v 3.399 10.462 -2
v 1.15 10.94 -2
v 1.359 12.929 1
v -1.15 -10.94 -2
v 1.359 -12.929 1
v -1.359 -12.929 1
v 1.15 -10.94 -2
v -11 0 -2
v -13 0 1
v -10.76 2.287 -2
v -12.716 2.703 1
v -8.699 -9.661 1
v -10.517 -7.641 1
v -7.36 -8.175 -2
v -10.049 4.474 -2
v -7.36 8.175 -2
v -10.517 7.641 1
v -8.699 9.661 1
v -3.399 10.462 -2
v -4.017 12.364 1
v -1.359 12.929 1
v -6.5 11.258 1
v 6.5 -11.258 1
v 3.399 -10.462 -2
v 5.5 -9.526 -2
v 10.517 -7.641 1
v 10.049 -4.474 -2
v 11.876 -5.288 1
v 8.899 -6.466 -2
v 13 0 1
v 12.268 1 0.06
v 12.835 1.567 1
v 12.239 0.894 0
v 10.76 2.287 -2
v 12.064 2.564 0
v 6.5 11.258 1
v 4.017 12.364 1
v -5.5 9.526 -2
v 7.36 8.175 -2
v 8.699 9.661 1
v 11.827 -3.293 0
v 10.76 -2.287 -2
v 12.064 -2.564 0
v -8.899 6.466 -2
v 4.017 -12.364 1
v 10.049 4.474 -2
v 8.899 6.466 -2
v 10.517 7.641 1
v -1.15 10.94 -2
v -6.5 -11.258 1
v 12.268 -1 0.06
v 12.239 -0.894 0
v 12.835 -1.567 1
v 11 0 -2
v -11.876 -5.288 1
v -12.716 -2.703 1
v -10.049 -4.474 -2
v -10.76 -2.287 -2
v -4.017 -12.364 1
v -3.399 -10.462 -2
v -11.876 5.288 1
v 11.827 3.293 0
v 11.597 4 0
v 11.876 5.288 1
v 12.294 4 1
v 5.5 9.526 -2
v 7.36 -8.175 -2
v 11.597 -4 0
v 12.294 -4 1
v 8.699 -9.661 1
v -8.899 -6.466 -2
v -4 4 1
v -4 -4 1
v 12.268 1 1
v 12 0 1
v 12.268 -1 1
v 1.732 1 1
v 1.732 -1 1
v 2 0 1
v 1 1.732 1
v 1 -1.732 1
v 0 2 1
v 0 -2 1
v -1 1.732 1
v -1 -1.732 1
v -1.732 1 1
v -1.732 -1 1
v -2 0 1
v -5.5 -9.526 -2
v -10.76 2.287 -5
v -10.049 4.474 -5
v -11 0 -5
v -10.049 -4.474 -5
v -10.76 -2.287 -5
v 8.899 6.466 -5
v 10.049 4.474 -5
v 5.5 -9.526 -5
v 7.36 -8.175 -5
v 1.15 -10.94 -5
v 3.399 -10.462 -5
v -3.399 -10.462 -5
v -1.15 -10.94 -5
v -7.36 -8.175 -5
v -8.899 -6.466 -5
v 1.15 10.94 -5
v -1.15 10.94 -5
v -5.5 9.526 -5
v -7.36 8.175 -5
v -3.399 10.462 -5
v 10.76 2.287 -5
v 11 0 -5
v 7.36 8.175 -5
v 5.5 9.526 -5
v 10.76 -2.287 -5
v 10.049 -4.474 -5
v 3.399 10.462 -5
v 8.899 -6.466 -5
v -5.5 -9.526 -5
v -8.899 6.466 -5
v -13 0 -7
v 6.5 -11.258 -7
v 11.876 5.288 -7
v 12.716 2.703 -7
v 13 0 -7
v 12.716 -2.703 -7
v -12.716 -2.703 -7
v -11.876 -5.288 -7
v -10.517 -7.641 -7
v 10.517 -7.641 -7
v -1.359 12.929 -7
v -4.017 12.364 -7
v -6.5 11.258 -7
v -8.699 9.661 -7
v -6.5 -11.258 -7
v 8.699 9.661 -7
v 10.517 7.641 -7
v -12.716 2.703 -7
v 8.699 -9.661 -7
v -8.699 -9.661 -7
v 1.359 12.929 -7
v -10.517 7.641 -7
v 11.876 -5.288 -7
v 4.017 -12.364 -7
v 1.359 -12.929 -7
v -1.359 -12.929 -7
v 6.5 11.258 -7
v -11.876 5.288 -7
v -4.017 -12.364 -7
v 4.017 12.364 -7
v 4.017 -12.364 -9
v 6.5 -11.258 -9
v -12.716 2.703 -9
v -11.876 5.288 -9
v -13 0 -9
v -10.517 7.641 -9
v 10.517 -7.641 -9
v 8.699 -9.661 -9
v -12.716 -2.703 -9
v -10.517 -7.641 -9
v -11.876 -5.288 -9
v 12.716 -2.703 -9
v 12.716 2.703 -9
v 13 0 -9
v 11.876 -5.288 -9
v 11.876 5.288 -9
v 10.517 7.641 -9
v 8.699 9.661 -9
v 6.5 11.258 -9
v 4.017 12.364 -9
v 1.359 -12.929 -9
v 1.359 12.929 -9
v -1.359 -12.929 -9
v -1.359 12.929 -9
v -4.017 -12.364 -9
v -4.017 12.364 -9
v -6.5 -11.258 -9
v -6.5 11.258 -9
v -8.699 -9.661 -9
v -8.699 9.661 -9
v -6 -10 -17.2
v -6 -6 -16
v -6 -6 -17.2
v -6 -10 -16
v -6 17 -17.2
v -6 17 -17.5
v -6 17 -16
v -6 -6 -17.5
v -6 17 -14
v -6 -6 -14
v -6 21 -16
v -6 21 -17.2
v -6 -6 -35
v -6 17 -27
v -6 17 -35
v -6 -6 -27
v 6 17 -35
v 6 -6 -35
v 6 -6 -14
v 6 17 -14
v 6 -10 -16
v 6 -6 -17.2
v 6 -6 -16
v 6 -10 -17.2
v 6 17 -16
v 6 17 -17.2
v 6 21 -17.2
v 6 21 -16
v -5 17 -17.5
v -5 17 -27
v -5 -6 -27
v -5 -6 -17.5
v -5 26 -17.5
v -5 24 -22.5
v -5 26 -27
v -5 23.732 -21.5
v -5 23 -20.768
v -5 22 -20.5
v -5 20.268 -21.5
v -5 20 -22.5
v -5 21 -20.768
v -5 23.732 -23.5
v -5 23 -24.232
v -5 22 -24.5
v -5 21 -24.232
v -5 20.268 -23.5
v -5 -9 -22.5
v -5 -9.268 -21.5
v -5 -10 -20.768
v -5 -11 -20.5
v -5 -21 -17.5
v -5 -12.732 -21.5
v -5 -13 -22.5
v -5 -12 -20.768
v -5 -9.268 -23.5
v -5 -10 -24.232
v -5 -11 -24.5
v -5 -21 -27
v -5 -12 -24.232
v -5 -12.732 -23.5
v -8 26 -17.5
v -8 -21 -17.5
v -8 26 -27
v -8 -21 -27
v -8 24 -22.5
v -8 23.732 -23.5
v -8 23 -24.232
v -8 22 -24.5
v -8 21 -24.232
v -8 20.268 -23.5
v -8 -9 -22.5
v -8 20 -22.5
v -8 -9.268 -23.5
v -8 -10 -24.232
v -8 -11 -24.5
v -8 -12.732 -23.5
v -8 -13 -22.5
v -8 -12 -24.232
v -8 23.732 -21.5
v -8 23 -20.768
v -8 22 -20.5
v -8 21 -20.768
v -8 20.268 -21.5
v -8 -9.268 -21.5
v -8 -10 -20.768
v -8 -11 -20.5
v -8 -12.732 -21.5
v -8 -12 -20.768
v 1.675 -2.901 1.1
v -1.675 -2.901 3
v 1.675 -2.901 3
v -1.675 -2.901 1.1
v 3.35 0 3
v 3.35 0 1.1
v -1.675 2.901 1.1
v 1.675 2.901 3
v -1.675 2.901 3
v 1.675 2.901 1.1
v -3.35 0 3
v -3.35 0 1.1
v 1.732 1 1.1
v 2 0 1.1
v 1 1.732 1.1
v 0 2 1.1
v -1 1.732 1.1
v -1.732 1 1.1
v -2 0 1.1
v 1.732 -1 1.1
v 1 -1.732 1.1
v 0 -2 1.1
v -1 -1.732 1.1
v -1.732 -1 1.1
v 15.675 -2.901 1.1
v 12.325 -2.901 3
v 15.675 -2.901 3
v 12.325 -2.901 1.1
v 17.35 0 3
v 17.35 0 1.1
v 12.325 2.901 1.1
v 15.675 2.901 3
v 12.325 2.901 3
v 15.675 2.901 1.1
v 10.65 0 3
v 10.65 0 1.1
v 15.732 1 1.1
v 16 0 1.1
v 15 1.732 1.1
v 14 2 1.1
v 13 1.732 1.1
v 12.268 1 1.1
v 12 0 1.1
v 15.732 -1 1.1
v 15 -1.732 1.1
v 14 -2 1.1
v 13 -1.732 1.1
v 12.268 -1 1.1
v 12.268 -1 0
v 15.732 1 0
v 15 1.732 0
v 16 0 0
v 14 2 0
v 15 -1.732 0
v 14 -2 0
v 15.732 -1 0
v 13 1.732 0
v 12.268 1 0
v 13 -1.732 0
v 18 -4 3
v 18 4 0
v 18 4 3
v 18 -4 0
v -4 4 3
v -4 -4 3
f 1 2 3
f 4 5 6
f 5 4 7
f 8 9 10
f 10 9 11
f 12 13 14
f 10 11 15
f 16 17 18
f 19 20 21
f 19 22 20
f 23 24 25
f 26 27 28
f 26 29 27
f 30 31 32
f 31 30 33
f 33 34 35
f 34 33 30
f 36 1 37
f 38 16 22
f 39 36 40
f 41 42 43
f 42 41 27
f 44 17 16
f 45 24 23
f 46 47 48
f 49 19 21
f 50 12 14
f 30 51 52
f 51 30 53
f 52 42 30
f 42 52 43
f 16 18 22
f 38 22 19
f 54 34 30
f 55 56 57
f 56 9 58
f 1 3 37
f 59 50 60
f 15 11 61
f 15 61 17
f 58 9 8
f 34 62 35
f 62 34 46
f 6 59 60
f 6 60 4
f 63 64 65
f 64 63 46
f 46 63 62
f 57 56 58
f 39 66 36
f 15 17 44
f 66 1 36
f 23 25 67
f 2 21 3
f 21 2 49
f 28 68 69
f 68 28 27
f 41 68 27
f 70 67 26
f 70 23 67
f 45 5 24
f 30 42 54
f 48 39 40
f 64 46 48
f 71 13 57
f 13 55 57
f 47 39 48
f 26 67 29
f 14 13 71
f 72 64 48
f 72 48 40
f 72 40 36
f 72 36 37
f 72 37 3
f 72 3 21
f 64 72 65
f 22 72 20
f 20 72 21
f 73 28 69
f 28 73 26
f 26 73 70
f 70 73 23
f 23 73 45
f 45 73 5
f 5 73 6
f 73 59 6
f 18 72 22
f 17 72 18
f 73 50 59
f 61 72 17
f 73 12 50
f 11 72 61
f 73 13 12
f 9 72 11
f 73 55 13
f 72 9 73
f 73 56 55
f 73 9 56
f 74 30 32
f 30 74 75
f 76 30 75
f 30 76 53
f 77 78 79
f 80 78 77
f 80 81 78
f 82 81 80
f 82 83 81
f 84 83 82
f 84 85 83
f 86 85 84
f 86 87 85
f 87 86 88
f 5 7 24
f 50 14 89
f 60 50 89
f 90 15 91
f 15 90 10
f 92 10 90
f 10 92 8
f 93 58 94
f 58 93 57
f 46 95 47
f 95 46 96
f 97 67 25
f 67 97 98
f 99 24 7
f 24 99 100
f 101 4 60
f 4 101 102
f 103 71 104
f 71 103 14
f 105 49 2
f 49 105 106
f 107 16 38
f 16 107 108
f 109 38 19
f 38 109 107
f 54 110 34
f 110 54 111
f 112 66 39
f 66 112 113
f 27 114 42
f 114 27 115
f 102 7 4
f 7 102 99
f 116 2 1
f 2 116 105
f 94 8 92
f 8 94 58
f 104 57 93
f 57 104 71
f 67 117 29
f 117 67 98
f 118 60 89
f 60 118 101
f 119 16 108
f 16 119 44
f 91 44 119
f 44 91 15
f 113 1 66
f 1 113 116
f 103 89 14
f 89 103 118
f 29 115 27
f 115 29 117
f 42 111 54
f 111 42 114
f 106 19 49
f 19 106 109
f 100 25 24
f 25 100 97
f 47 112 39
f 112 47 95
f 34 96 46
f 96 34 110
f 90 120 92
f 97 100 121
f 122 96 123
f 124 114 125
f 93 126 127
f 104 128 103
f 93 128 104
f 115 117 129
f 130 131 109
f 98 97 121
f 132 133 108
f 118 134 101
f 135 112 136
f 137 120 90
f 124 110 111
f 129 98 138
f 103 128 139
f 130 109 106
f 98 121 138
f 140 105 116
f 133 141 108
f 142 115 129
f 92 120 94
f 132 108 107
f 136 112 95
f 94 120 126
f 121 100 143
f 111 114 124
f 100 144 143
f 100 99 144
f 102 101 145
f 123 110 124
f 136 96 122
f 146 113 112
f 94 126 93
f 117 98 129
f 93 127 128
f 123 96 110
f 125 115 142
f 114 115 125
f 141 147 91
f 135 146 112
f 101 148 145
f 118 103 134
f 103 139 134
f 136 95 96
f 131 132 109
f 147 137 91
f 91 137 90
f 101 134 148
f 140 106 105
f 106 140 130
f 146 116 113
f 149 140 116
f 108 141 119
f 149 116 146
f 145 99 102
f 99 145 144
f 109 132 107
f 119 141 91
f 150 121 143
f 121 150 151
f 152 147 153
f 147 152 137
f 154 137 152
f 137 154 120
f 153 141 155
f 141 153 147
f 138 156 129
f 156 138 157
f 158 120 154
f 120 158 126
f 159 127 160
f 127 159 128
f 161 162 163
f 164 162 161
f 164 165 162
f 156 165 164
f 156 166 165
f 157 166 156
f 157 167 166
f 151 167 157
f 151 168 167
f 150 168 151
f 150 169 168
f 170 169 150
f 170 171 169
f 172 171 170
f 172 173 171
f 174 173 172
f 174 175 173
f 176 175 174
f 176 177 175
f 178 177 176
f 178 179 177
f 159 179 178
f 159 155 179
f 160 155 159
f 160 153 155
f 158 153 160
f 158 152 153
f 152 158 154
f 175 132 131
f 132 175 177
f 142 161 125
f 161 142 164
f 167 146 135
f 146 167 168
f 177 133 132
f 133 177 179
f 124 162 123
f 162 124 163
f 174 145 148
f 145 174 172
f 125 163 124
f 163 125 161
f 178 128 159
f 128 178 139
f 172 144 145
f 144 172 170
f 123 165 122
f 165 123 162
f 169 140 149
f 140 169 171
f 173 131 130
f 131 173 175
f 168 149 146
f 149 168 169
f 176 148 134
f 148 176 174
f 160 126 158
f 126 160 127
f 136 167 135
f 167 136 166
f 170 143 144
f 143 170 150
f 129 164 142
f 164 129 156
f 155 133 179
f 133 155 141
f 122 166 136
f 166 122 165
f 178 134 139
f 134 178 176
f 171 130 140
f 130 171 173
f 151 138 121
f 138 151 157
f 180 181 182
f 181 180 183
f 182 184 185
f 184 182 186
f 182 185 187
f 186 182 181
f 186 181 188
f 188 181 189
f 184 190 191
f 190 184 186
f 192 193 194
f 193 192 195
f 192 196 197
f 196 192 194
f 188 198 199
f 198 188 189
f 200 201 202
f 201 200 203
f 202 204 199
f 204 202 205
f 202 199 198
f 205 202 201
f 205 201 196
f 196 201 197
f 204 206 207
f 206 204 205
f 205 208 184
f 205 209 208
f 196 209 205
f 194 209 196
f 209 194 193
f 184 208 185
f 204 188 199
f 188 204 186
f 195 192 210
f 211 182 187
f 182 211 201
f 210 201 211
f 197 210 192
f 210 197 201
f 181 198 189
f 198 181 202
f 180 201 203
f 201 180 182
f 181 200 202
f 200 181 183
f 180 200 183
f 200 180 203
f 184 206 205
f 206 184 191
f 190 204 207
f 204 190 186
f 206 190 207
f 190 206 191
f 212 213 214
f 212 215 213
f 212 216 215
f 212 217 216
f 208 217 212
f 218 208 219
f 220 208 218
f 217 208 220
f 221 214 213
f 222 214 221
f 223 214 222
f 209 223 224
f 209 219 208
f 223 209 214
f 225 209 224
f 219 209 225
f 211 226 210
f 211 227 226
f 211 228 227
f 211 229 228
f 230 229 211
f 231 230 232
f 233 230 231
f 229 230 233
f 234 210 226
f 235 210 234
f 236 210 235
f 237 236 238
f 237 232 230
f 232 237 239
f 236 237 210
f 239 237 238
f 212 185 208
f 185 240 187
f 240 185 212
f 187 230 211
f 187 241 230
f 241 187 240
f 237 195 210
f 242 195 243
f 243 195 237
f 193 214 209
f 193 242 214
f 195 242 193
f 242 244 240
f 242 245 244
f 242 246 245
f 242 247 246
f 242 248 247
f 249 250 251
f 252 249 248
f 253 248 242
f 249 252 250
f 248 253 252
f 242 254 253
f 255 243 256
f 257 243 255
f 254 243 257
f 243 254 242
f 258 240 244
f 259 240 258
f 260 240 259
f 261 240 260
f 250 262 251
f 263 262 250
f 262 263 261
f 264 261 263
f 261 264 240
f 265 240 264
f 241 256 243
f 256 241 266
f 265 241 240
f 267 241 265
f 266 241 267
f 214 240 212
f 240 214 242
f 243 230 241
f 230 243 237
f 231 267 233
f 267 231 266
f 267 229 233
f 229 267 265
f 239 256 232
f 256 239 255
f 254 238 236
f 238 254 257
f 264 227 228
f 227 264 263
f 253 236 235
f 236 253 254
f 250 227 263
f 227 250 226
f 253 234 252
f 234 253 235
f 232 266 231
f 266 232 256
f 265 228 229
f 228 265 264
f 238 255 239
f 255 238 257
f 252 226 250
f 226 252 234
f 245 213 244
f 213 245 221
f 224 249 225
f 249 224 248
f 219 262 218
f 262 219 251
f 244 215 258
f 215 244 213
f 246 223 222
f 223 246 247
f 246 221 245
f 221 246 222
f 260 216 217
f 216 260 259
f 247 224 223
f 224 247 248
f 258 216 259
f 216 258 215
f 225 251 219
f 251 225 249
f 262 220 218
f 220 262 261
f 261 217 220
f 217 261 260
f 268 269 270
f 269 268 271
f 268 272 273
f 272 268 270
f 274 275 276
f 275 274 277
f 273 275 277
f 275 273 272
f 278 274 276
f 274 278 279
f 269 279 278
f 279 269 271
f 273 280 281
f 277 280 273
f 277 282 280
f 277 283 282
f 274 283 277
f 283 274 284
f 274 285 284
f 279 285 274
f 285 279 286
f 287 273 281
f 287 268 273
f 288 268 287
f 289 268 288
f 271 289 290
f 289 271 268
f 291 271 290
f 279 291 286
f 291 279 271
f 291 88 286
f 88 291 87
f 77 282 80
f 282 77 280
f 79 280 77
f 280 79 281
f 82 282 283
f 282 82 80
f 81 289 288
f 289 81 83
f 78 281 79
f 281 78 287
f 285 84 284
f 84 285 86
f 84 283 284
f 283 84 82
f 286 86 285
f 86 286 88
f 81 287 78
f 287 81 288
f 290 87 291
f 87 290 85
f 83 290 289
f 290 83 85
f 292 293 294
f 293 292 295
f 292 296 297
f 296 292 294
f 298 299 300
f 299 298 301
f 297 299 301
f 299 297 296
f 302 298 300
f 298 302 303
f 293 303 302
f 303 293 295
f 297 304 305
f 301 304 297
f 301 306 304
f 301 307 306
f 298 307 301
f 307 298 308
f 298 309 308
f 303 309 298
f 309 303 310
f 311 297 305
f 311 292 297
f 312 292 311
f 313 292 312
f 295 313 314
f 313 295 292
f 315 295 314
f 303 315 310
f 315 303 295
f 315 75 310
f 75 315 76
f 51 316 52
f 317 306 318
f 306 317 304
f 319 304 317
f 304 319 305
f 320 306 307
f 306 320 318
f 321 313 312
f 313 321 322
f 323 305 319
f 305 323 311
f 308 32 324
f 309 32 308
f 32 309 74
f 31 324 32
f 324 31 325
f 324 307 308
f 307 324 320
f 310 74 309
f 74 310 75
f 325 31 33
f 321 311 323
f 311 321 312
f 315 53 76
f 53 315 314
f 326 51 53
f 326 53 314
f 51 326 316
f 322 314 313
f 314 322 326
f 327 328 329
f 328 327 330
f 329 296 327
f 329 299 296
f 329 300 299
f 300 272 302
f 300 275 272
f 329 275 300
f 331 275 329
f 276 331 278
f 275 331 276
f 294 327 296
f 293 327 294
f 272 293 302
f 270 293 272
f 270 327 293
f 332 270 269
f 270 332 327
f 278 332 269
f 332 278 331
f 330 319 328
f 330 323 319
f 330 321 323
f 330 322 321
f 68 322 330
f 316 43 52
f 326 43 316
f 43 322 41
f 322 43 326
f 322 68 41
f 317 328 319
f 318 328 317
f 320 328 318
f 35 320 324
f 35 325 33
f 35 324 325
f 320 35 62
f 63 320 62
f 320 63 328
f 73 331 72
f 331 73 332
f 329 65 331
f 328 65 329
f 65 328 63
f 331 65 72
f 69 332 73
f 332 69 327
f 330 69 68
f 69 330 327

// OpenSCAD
// file: gearModule.scad
/* the original one was posted by by Entropic
 * on Jan 30, 2015; 5:25pm,  on OpenSCAD official forum
 *
 * License? by official author:
 * "Also I thought that someone might benefit from this if they aren't able to make a gear themselves."
 *
 */

numberOfTeeth = 20;
widthOfTeeth = 4;
heightOfTeeth = 5;
thicknessOfGear = 5;
radiusOfHoleForShaft = 4.242640687;  //If shaft is square, find the square of one side,
sidesOfShaft = 4;                    //multiply by two and then square root that to get radius
//diameter = ((teethNo x 1.7 x teethWidth)/pi)+ 2teethHeight

module tooth(width, thickness, height){
  scale([width/5,thickness/5,height/10]){
    difference(){
      translate([-2.5,0,0])
      cube([5,5,10]);
      translate([5+1.25-2.5,0-1,0])
      rotate([0,-14.0362434,0])
        cube([5,5+2,12]);
      translate([0-1.25-2.5,0+5+1,0])
      rotate([0,-14.0362434,180])
        cube([5,5+2,12]);
    }
  }
}
module gear(toothNo, toothWidth, toothHeight, thickness,holeRadius,holeSides){
  radius = (toothWidth*1.7*toothNo)/3.141592653589793238/2;
  rotate([-90,0,0])
  difference(){
    union(){
      for(i=[0:toothNo]){
        rotate([0,(360/toothNo)*i,0])
        translate([0,0,radius-0.5])
          tooth(toothWidth,thickness,toothHeight);
      }
      translate([0,thickness,0])
      rotate([90,0,0])
        cylinder(r=radius, h=thickness);
    }
  translate([0,thickness+1,0])
  rotate([90,0,0])
    cylinder(r=holeRadius,h=thickness+2,$fn=holeSides);
  }
}

module gearInside(toothNo, toothWidth, toothHeight, thickness,holeRadius,holeSides){
  radius = (toothWidth*1.7*toothNo)/3.141592653589793238/2;
  rotate([-90,0,0])
//  difference(){
    union(){
      for(i=[0:toothNo]){
        rotate([0,(360/toothNo)*i,0])
        translate([0,0,radius-0.5])
            mirror([0,0,1])
                translate([0,0,-toothHeight]) 
                    tooth(toothWidth,thickness,toothHeight);
      }
    }
//  translate([0,thickness+1,0])
//  rotate([90,0,0])
//    cylinder(r=holeRadius,h=thickness+2,$fn=holeSides);
//  }
}


//gear(numberOfTeeth,widthOfTeeth,heightOfTeeth,thicknessOfGear,radiusOfHoleForShaft,sidesOfShaft);

gearInside(numberOfTeeth,widthOfTeeth,heightOfTeeth,thicknessOfGear,radiusOfHoleForShaft,sidesOfShaft);

// tooth(toothWidth,thickness,toothHeight);

tooth(widthOfTeeth,thicknessOfGear,heightOfTeeth);

numberOfTeeth = 20;
widthOfTeeth = 4;
heightOfTeeth = 5;
thicknessOfGear = 5;
radiusOfHoleForShaft = 4.242640687;  //If shaft is square, find the square of one side,
sidesOfShaft = 4;                    //multiply by two and then square root that to get radius
//diameter = ((teethNo x 1.7 x teethWidth)/pi)+ 2teethHeight

module tooth(width, thickness, height){
  scale([width/5,thickness/5,height/10]){
    difference(){
      translate([-2.5,0,0])
      cube([5,5,10]);
      translate([5+1.25-2.5,0-1,0])
      rotate([0,-14.0362434,0])
        cube([5,5+2,12]);
      translate([0-1.25-2.5,0+5+1,0])
      rotate([0,-14.0362434,180])
        cube([5,5+2,12]);
    }
  }
}
module gear(toothNo, toothWidth, toothHeight, thickness,holeRadius,holeSides){
  radius = (toothWidth*1.7*toothNo)/3.141592653589793238/2;
  rotate([-90,0,0])
  difference(){
    union(){
      for(i=[0:toothNo]){
        rotate([0,(360/toothNo)*i,0])
        translate([0,0,radius-0.5])
          tooth(toothWidth,thickness,toothHeight);
      }
      translate([0,thickness,0])
      rotate([90,0,0])
        cylinder(r=radius, h=thickness);
    }
  translate([0,thickness+1,0])
  rotate([90,0,0])
    cylinder(r=holeRadius,h=thickness+2,$fn=holeSides);
  }
}

gear(numberOfTeeth,widthOfTeeth,heightOfTeeth,thicknessOfGear,radiusOfHoleForShaft,sidesOfShaft);
// main file
use <gearModule.scad>

module gear2(thick=5,flip=false) // height 15
{
    translate([0,0,0])
    intersection()
    {
        //thick = 5;
        translate([0,0,thick])
            gear(toothNo=14, toothWidth=2,
                 toothHeight=3, thickness=thick,
                 holeRadius=0,holeSides=4);

        union()
        {
            r1=11.5;
            r2 = 8.5;
            
            if(flip) {
            cylinder( r1=r2,r2=r1,h=thick/4);
            translate([0,0,thick/4]) cylinder( r1=r1,r2=r1,h=3*thick/4);
            //translate([0,0,3*thick/4]) cylinder( r1=r1,r2=r2,h=thick/4);
            }
            else
            {
            //cylinder( r1=r2,r2=r1,h=thick/4);
            translate([0,0,0]) cylinder( r1=r1,r2=r1,h=3*thick/4);
            translate([0,0,3*thick/4]) cylinder( r1=r1,r2=r2,h=thick/4);
            }
        }
    }
}

module spool(a=1,r1=8.5,r2=7.5,maintrackextra=0)
{
    
    
    //middle
    hull() {
        translate( [0,0,0] )
            cylinder( r1=r1, r2=r2, h=a );
        translate( [0,10,0] )
            cylinder( r1=r1, r2=r2, h=a );
    }
    
    hull() {
        translate( [0,0,a] )
            cylinder( r1=r2, r2=r2, h=a+maintrackextra );
        translate( [0,10,a] )
            cylinder( r1=r2, r2=r2, h=a+maintrackextra );
    }
    hull() {
        translate( [0,0,2*a+maintrackextra] )
            cylinder( r1=r2, r2=r1, h=a );
        translate( [0,10,2*a+maintrackextra] )
            cylinder( r1=r2, r2=r1, h=a );
    }
}

module bottom(l=8)
{
    // 3/4 of a gear
    intersection()
    {
        rotate([0,0,360/14/2]) gear2(4);
        translate([-10,-12-2,0]) cube([20,12,5]); // cut in half
        rotate([0,0,-15]) translate([-10,-12,0]) cube([20,12,5]); // cut top couple teeth
    }
    // structure between gears:
    hull() {
        cylinder( d=15.1, h=4 );
        translate([0,l,0]) cylinder( d=15.1, h=4 );
    }
    // second gear, rotated to fit properly into first one's teeth
    
//    translate([0,l,0]) mirror([0,1,0]) intersection()
//    {
//        rotate([0,0,360/14/2]) gear2(4);
//        translate([-10,-12-2,0]) cube([20,12,5]); // cut in half
//        rotate([0,0,-15]) translate([-10,-12,0]) cube([20,12,5]); // cut top couple teeth
//    }
}

module spool2(r1=8.5,r2=7.5,a=1,b=1,c=1,length=8)
{
    
    
    //middle
    hull() {
        translate( [0,0,0] )
            cylinder( r1=r1, r2=r2, h=a );
        translate( [0,length,0] )
            cylinder( r1=r1, r2=r2, h=a );
    }
    
    hull() {
        translate( [0,0,a] )
            cylinder( r1=r2, r2=r2, h=b );
        translate( [0,length,a] )
            cylinder( r1=r2, r2=r2, h=b );
    }
    hull() {
        translate( [0,0,a+b] )
            cylinder( r1=r2, r2=r1, h=c );
        translate( [0,length,a+b] )
            cylinder( r1=r2, r2=r1, h=c );
    }
}


/*    tunnels are shorter !!!! */
module part1(full=true)
{
    // main body
//    difference()
    {
        union()
        {
            bottom(l=0);
            translate([0,0,14]) mirror([0,0,1]) bottom(l=0);
            
            translate([0,0,4])
                spool2(r1=7.5,r2=6,a=0.8,b=1.5,c=0.7,length=0);
            translate([0,0,7])
                spool2(r1=7.5,r2=6,a=0.7,b=1.5,c=0.8,length=0);
        }

    }
    
    // springs - 1
    translate([-13,1,0])
    {
        difference() 
        {
            cube( [6,4,10] );
            translate([6.5,-1,8]) rotate([-90,90,0]) cylinder(d=9.5,h=20,$fn=6); // main hole
            //translate([0,-1,16]) rotate([-90,90,0]) cylinder(d=9.5,h=20,$fn=6); // upper trim
            translate([0,-1,0]) rotate([-90,90,0]) cylinder(d=9.5,h=20,$fn=6); // lower trim
            translate([-1,4,7]) rotate([0,90,0]) cylinder(d=4,h=20,$fn=6); // upper trim
        }
    }
    
    // springs - 2
    mirror([1,0,0])
    translate([-13,1,0])
    {
        difference() 
        {
            cube( [6,4,10] );
            translate([6.5,-1,8]) rotate([-90,90,0]) cylinder(d=9.5,h=20,$fn=6); // main hole
            //translate([0,-1,16]) rotate([-90,90,0]) cylinder(d=9.5,h=20,$fn=6); // upper trim
            translate([0,-1,0]) rotate([-90,90,0]) cylinder(d=9.5,h=20,$fn=6); // lower trim
            translate([-1,4,7]) rotate([0,90,0]) cylinder(d=4,h=20,$fn=6); // upper trim
        }
    }
    
    offset = 3;
    
    rotate([0,0,180])
    {
    //    // mount for the press-plate:
    //    translate([10-3,-37-offset,-7])
    //            difference()
    //            {
    //            translate( [0,-8,0] ) cube( [3,25+2*8+offset,9.5] );
    //            translate([1.1,-4,4.5]) 
    //                rotate([0,90,0])
    //                        translate([0,0,-2]) cylinder( d=4, h=5, $fn=12 ); // 3mm screw
    //            translate([1.1,25+4,4.5]) 
    //                rotate([0,90,0])
    //                        translate([0,0,-2]) cylinder( d=4, h=5, $fn=12 ); // 3mm screw
    //            }
    //    
    //    // second wall, opposite to the servo:
    //    // screw holes because why not
    //    translate([-10,-37-offset,-7])
    //            difference()
    //            {
    //            translate( [0,-8,0] ) cube( [3,25+2*8+offset,9.5] );
    //            translate([1.1,-4,4.5]) 
    //                rotate([0,90,0])
    //                        translate([0,0,-2]) cylinder( d=4, h=5, $fn=12 ); // 3mm screw
    //            translate([1.1,25+4,4.5]) 
    //                rotate([0,90,0])
    //                        translate([0,0,-2]) cylinder( d=4, h=5, $fn=12 ); // 3mm screw
    //            }
    //    // back wall, with mounts for the Hillberry wires
    //    translate([-10,-37-3-8-1,-7])
    //        cube([20,3,9.5]);
                
//    // front support for the gear:
//    intersection()
//    {
//    translate([-10,0,-7])
//            cube( [20,12,8] );
//    translate([0,0,-7])
//        cylinder( d1=13, d2=20, h=7 );
//    }
         
    
//    // after the half-spool supports for spring-mounts and control-wire-mount:
//    translate([-10,-4,-7])
//            cube( [20,4,11] );
//    translate([-7,-4,0])
//            cube( [14,4,17]);

    // glue side mounts to the main body
    translate([-10,-5,0])
            cube( [20,6,4] );
    
    
    // control wire:
    translate([-8,-4,20]) rotate([0,90,0])
    {
        difference() 
        {
            translate([0,0,1]) cube( [6,4,14] );
            translate([6.5,-1,8]) rotate([-90,90,0]) cylinder(d=9.5,h=20,$fn=6); // main hole
            translate([0,-1,16]) rotate([-90,90,0]) cylinder(d=9.5,h=20,$fn=6); // upper trim
            translate([0,-1,0]) rotate([-90,90,0]) cylinder(d=9.5,h=20,$fn=6); // lower trim
        }
    }
    
    // top hat, unfortunetely - unprintable for now
//    translate([0,0,14])
//        cylinder( d1=20,d2=16,h=1 );
    
    }
}


module servo_spool()
{
    // assumptions for control wire displacement = 50mm
    // diameter for full motor rotation should be 16mm
    // 180 degrees (1/2) rotation should be around d=32mm
    //translate([0,-30,0])
    difference()
    {
        union() // spool
        {
            translate([0,0,-1]) cylinder( d1=26, d2=22,h=3 );
        translate([0,0,2]) cylinder( d=22,h=3 );
        translate([0,0,5]) cylinder( d1=22,d2=26, h=2 );
        translate([0,0,7]) cylinder( d1=26,d2=26, h=2 );
        }
    }
}

module servo()
{
// SERVO
    rotate([0,180,0])
        {
            servo_spool();
            translate([-6,-6,14]) cube( [12,23,21] );
            translate([-6,-6-4,16]) cube( [12,10,1.2] );
            translate([-6,-6+23,16]) cube( [12,4,1.2] );
        }
}

// tmp3
module smallplate_two_holes()
{
    difference()
    {
        translate([-4,-4,0]) cube( [14+4+4,8,3] );
        translate([0,0,1.1])
        rotate([0,0,0])
        {
            cylinder( d=6.7, h=2, $fn=6 ); // 3mm nut
            translate([0,0,-2]) cylinder( d=4, h=5, $fn=12 ); // 3mm screw
        }
        translate([14,0,1.1])
        rotate([0,0,0])
        {
            cylinder( d=6.7, h=2, $fn=6 ); // 3mm nut
            translate([0,0,-2]) cylinder( d=4, h=5, $fn=12 ); // 3mm screw
        }
    }
}

module servo_mount()
{
    translate([-8,-7,-27])
    {
        difference()
        {
        translate( [0,-8-6,0] ) cube( [3,25+2*8+6,9.5] );
        translate([1.1,-4,4.5]) 
            rotate([0,90,0])
                    translate([0,0,-2]) cylinder( d=4, h=5, $fn=12 ); // 3mm screw
        translate([1.1,25+4,4.5]) 
            rotate([0,90,0])
                    translate([0,0,-2]) cylinder( d=4, h=5, $fn=12 ); // 3mm screw
        }
        
//        // horizontal support
//        intersection(){
////        rotate([0,-35,0])
//        translate( [-9.5+3,-8-6-3,-3] ) cube( [9.5,25+2*8+6+3,3] );
//        translate( [-9.5+3,-8-6-3,-3-3] ) cube( [9.5,25+2*8+6+3,3+6] );
//        }
        
//        translate( [0,36,0] )
//        rotate([ 90,90,0]) smallplate_two_holes();
    }   
}



//part1();

servo();
servo_mount();
smallplate_two_holes();
//
//translate( [0,-5,0] )
//rotate([0,0,0])
//{
//    part1();
//    translate([0,-5,-4]) rotate([0,0,0]) translate([0,30,20])
//    {
//        servo_mount();
//        servo();
//    }
//}
//
//translate( [35,5,0] )
//rotate([0,0,5])
//{
//    part1();
//    translate([0,-5,-4]) rotate([0,0,0]) translate([0,30,20])
//    {
//        servo_mount();
//        servo();
//    }
//}


// bare cylinder to be hull'ed in pairs:
//translate( [-35,5,-8] )
//    cylinder( d=12,h=5 );
//translate( [0,-5,-8] )
//    cylinder( d=12,h=5 );
//translate( [35,0,-8] )
//    cylinder( d=12,h=5 );
//
//hull() {
//translate( [-35,0,-8] )
//    cylinder( d=12,h=5 );
//translate( [0,-5,-8] )
//    cylinder( d=12,h=5 );
//}
//hull() {
//translate( [0,-5,-8] )
//    cylinder( d=12,h=5 );
//translate( [35,5,-8] )
//    cylinder( d=12,h=5 );
//}


// mount for the thumb:
//
//translate( [-60,14,-8] )
//    cube([20,26,3]);
//translate( [-60,20,-1] )
//        rotate([90,0,0]) rotate([ 0,90,0]) smallplate_two_holes();


module servo_mount2()
{
    translate([6,-9,-27]) // left wall
        cube([3,26,9.5]);
    translate([-6-3,-9,-27]) // right wall
        cube([3,26,9.5]);
    translate([-6-3,-9,-27-3]) // back support
        cube([12+6,3,9.5+3]);
    // mounting plates
    translate([6,-9+23,-27]) // left
    difference()
    {
        cube([11,3,9.5]);
        translate([7,1.5,4.25])
        rotate([90,90,0])
        {
            cylinder( d=6.7, h=2, $fn=6 ); // 3mm nut
            translate([0,0,-2]) cylinder( d=4, h=5, $fn=12 ); // 3mm screw
        }
    }
    translate([-6-11,-9+23,-27]) // left
    difference()
    {
        cube([11,3,9.5]);
        translate([7-3,1.5,4.25])
        rotate([90,90,0])
        {
            cylinder( d=6.7, h=2, $fn=6 ); // 3mm nut
            translate([0,0,-2]) cylinder( d=4, h=5, $fn=12 ); // 3mm screw
        }
    }
    
    translate([6,-9,-27]) // right
    rotate([-90,0,0])
    difference()
    {
        cube([11,3,9.5+16.5]);
        translate([7,1.5,4.25])
        rotate([90,90,0])
        {
            cylinder( d=6.7, h=2, $fn=6 ); // 3mm nut
            translate([0,0,-2]) cylinder( d=4, h=5, $fn=12 ); // 3mm screw
        }
    }
    
    
    translate([-6-11,-9,-27]) // left
    rotate([-90,0,0])
    difference()
    {
        cube([11,3,9.5+16.5]);
        translate([7-3,1.5,4.25])
        rotate([90,90,0])
        {
            cylinder( d=6.7, h=2, $fn=6 ); // 3mm nut
            translate([0,0,-2]) cylinder( d=4, h=5, $fn=12 ); // 3mm screw
        }
    }

}


//translate([0,part1();
//part1();
//part1();
servo();
